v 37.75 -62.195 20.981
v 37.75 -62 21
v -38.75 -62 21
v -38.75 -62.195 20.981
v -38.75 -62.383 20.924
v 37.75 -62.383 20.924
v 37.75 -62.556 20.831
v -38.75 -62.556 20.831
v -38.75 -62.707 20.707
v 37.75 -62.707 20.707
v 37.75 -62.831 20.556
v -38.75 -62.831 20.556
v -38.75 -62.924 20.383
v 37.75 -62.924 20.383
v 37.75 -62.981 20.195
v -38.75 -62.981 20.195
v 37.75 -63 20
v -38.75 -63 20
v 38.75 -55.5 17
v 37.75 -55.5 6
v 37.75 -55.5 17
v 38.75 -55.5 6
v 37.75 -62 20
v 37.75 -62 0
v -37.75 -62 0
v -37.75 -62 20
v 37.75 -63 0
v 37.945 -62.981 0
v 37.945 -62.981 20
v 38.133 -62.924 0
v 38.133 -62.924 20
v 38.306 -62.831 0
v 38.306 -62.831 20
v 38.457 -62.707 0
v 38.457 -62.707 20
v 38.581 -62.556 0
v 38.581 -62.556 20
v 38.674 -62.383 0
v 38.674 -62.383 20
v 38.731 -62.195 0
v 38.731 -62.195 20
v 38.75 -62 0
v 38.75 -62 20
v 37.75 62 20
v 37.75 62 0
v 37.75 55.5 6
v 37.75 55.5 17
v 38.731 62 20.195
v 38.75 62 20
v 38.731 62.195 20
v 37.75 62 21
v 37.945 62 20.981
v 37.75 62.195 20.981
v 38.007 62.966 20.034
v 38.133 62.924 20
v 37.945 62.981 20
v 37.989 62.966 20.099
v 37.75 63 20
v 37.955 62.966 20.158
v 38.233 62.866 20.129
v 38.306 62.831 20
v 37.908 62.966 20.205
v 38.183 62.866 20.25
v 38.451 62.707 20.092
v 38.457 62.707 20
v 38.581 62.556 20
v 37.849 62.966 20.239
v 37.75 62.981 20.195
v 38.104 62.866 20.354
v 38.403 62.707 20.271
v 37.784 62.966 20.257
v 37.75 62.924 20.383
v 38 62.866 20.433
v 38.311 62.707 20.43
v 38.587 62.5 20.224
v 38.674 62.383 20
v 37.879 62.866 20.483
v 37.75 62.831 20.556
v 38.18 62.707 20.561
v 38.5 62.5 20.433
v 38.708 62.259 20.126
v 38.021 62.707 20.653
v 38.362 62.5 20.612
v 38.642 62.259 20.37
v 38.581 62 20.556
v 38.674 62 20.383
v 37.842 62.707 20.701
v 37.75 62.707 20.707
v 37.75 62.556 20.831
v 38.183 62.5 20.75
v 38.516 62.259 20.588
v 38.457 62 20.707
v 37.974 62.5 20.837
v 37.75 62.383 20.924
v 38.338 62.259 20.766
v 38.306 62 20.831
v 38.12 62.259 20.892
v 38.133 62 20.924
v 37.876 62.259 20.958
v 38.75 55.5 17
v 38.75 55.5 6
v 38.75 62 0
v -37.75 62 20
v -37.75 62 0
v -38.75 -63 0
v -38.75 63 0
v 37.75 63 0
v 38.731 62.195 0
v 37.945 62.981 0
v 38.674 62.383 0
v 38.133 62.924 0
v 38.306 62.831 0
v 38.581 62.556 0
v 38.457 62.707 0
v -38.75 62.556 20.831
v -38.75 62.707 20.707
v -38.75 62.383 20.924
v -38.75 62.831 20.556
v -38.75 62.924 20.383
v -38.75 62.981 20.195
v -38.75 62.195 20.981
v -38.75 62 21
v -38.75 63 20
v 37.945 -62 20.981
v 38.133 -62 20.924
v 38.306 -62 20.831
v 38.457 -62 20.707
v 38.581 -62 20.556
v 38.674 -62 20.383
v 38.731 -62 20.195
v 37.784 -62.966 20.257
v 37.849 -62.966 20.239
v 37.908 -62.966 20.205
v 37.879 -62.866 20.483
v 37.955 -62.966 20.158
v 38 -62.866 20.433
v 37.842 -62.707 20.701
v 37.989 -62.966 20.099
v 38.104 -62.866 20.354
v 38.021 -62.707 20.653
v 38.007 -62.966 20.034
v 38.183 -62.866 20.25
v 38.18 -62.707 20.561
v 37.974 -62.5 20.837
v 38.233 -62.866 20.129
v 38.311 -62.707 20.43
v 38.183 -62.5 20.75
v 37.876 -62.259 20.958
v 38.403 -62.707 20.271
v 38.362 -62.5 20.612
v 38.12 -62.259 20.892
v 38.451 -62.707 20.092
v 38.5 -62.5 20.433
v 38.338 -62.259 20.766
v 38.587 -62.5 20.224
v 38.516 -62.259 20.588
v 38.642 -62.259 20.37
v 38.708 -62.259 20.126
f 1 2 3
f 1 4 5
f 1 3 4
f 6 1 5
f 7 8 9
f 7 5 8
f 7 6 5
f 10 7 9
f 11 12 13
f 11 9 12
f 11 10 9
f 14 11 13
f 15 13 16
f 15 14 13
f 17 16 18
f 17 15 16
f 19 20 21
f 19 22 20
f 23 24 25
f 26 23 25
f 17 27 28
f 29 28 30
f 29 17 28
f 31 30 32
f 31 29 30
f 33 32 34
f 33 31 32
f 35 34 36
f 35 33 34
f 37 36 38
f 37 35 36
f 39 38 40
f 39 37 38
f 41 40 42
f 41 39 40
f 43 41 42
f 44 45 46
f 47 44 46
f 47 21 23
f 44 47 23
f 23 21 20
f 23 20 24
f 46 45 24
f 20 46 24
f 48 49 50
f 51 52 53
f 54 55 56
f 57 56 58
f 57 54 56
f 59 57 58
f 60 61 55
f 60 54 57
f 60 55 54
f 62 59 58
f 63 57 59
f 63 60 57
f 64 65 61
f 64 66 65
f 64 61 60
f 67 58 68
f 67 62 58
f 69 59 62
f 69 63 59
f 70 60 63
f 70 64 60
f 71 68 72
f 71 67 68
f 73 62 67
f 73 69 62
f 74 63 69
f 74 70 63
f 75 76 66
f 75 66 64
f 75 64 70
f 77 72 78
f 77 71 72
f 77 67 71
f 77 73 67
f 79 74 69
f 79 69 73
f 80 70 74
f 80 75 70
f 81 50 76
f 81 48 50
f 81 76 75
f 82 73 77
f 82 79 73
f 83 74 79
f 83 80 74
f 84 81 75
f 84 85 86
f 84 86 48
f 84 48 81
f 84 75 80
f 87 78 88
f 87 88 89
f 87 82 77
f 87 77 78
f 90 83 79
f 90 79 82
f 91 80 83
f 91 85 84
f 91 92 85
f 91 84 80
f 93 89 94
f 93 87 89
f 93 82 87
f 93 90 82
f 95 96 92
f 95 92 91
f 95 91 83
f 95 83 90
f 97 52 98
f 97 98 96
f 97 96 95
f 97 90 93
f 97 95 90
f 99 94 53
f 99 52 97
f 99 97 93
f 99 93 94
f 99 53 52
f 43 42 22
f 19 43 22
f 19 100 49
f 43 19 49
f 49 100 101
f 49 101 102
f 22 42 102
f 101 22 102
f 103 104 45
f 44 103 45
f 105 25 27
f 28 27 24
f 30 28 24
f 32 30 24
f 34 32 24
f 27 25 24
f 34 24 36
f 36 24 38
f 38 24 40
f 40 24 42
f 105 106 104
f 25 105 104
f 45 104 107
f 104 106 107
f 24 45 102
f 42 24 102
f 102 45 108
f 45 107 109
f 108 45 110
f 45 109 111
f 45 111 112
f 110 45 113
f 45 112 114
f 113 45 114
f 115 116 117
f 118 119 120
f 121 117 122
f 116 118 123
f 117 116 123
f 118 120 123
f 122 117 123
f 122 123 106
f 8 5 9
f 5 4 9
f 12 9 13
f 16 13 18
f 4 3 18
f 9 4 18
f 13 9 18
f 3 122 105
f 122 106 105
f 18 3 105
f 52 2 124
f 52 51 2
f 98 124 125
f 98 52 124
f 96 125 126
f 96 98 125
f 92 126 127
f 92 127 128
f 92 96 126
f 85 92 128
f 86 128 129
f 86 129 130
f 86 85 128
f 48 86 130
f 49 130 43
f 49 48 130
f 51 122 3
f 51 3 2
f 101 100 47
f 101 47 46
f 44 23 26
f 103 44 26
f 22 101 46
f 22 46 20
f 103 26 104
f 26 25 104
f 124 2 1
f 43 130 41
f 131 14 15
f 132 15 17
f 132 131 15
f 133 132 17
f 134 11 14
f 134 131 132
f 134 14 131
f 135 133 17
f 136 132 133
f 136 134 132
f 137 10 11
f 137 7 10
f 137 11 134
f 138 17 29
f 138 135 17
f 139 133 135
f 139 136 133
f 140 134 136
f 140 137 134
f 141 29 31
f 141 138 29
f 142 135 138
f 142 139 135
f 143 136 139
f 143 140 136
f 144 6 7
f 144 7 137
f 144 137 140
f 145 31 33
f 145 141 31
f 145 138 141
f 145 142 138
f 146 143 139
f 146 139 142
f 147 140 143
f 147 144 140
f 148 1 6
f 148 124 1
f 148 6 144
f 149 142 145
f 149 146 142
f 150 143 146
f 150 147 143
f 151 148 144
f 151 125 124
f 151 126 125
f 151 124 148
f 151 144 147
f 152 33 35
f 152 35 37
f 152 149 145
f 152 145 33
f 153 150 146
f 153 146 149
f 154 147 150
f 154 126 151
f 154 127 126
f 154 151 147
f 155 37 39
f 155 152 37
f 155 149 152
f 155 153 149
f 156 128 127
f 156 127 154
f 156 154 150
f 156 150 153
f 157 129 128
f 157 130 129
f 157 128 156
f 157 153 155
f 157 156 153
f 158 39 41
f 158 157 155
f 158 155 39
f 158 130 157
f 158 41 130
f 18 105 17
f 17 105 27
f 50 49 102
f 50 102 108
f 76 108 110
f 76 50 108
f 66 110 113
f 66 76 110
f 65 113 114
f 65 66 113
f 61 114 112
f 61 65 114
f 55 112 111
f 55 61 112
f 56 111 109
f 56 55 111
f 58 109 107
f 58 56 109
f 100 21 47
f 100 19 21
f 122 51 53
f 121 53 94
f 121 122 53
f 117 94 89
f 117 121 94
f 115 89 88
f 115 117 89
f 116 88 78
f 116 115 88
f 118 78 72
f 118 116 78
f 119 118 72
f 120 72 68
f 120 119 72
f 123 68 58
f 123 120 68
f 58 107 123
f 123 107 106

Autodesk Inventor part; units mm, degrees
ref_plane "YZ Plane" through (0, 0, 0) normal (1, 0, 0) x (0, 1, 0)
ref_plane "XZ Plane" through (0, 0, 0) normal (0, 1, 0) x (-1, 0, 0)
ref_plane "XY Plane" through (0, 0, 0) normal (0, 0, 1) x (1, 0, 0)
sketch "Skizze1" plane through (0, 0, 0) normal (0, 0, 1) x (1, 0, 0)
  line L0 (-38.75, -63) -> (38.75, -63)
  line L1 (38.75, -63) -> (38.75, 63)
  line L2 (38.75, 63) -> (-38.75, 63)
  line L3 (-38.75, 63) -> (-38.75, -63)
  line L4 (-38.75, -63) -> (38.75, 63) construction
  line L5 (38.75, -63) -> (-38.75, 63) construction
  point P0 (0, 0)
  dimension "d23" = 77.5
  dimension "d24" = 126
extrude "Grundkörper" add sketch "Skizze1" along normal blind 21
sketch "Skizze6" plane through (0, 0, 0) normal (0, 0, -1) x (-1, 0, 0)
  line L0 (-37.75, -62) -> (37.75, -62)
  line L1 (37.75, -62) -> (37.75, 62)
  line L2 (37.75, 62) -> (-37.75, 62)
  line L3 (-37.75, 62) -> (-37.75, -62)
  line L4 (-37.75, -62) -> (37.75, 62) construction
  line L5 (37.75, -62) -> (-37.75, 62) construction
  line L6 (-38.75, 63) -> (38.75, 63) projected
  line L7 (38.75, 63) -> (38.75, -63) projected
  point P0 (0, 0)
  dimension "d27" = 1
  dimension "d28" = 1
extrude "Ausschnitt" cut sketch "Skizze6" against normal blind 20
sketch "Skizze8" plane through (38.75, -63, 0) normal (1, 0, 0) x (0, 0, -1)
  line L0 (0, 0) -> (-21, 0) construction
  line L1 (0, 0) -> (0, 126) construction
  line L2 (0, 126) -> (-21, 126) construction
  line L3 (-21, 0) -> (-21, 126) construction
  line L4 (-25.2, 63) -> (4.2, 63) construction
  line L5 (-6, 7.5) -> (-17, 7.5)
  line L6 (-17, 7.5) -> (-17, 118.5)
  line L7 (-17, 118.5) -> (-6, 118.5)
  line L8 (-6, 118.5) -> (-6, 7.5)
  line L9 (-6, 7.5) -> (-17, 118.5) construction
  line L10 (-17, 7.5) -> (-6, 118.5) construction
  point P0 (0, 63)
  point P1 (-11.5, 63)
  dimension "d32" = 7.5
  dimension "d33" = 6
  dimension "d34" = 4
extrude "Anschlüsse" cut sketch "Skizze8" against normal up to surface (1 mm away)
fillet "Rundung2" radius 1 5 edges at (38.75, 0, 21) (0, 63, 21) (0, -63, 21) (38.75, -63, 10.5) (38.75, 63, 10.5)
equation "\"d28\" = d27"
properties part number "800-20-MOTOR-CONTROLLER-BLD-300B-02" material "Aluminium 6061"
